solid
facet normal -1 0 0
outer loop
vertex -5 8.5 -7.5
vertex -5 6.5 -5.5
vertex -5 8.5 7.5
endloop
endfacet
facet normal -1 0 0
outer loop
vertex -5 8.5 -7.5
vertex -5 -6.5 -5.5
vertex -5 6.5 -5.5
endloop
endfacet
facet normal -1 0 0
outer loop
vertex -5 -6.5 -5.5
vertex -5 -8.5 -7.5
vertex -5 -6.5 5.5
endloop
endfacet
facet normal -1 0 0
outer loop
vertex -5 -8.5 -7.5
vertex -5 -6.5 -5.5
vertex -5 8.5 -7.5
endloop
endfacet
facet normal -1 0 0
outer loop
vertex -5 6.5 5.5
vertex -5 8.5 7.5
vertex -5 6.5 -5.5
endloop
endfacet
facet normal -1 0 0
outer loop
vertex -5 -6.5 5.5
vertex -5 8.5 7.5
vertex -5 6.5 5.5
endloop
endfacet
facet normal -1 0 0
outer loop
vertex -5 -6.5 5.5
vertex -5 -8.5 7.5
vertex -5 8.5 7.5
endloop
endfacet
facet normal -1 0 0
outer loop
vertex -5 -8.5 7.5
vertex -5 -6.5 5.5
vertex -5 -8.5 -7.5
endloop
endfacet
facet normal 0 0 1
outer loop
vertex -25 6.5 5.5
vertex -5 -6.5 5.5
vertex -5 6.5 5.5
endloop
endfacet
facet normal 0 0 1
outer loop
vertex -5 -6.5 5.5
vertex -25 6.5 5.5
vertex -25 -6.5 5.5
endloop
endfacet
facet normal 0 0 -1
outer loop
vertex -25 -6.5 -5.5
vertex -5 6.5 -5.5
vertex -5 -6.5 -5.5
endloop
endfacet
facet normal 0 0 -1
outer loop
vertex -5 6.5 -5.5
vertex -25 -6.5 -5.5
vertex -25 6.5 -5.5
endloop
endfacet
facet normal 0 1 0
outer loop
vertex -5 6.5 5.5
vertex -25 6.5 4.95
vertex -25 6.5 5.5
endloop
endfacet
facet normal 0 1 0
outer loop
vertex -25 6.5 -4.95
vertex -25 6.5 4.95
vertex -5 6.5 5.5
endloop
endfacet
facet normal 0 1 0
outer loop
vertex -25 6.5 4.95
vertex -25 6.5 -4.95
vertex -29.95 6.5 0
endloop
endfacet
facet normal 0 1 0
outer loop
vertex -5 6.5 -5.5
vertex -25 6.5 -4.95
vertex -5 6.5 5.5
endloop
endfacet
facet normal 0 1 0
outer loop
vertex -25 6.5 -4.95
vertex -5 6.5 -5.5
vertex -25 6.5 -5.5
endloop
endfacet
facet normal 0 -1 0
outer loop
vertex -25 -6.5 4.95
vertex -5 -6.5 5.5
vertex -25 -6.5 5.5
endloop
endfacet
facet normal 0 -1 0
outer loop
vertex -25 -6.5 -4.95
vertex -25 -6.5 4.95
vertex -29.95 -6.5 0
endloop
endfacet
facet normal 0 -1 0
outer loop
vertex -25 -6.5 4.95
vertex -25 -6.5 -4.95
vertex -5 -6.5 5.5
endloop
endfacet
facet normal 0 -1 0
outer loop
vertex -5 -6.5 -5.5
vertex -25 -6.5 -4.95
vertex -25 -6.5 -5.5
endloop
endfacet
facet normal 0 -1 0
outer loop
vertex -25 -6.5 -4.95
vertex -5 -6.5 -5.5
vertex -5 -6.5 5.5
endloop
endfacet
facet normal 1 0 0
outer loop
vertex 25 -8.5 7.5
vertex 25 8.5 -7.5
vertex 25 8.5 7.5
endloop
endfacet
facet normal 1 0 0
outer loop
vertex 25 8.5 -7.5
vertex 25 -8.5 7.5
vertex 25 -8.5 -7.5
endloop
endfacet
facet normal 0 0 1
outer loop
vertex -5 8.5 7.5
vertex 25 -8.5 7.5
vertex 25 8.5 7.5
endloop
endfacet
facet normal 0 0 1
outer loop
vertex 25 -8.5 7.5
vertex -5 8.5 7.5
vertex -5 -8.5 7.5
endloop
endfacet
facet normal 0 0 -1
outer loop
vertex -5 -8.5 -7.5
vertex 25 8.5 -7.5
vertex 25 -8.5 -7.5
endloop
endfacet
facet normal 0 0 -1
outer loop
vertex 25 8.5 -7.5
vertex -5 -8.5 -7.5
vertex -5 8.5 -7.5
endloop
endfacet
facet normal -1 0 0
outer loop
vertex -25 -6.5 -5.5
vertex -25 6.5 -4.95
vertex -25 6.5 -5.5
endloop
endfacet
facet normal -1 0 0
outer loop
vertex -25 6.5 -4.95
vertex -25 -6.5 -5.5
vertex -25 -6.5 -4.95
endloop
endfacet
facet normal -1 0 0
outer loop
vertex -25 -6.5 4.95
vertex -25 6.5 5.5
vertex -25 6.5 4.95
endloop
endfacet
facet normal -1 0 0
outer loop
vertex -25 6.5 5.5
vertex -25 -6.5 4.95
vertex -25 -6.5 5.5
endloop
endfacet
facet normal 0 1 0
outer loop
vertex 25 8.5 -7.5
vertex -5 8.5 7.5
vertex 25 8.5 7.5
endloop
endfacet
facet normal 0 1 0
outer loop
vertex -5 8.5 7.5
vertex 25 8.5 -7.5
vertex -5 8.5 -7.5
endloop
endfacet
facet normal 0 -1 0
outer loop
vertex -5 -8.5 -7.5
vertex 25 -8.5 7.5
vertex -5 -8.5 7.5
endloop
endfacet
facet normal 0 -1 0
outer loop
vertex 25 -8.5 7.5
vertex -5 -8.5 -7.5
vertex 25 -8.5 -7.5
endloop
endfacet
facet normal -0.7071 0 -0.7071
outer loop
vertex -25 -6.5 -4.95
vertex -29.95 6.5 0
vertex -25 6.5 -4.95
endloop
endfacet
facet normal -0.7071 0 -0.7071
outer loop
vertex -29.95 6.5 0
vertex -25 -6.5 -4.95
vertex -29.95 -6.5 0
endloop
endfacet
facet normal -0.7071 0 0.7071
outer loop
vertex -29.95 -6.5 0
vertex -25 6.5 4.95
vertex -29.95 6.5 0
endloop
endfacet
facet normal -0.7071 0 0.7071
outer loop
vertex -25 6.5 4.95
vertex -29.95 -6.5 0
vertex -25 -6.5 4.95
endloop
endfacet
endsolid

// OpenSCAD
difference() {
    part1(30);
    //translate([29,0,0]) part1(0);
}

module part1(fullsize) {
    difference() {
        cube([50,17,15], center=true);
        translate([-fullsize,0,0]) difference() {
            cube([50,20,20], center=true);
            cube([50,13,11], center=true);
        };
    }
    color([1,0,0]) translate([-25,0,0]) rotate([0,45,0]) cube([7,13,7], center=true);
}
